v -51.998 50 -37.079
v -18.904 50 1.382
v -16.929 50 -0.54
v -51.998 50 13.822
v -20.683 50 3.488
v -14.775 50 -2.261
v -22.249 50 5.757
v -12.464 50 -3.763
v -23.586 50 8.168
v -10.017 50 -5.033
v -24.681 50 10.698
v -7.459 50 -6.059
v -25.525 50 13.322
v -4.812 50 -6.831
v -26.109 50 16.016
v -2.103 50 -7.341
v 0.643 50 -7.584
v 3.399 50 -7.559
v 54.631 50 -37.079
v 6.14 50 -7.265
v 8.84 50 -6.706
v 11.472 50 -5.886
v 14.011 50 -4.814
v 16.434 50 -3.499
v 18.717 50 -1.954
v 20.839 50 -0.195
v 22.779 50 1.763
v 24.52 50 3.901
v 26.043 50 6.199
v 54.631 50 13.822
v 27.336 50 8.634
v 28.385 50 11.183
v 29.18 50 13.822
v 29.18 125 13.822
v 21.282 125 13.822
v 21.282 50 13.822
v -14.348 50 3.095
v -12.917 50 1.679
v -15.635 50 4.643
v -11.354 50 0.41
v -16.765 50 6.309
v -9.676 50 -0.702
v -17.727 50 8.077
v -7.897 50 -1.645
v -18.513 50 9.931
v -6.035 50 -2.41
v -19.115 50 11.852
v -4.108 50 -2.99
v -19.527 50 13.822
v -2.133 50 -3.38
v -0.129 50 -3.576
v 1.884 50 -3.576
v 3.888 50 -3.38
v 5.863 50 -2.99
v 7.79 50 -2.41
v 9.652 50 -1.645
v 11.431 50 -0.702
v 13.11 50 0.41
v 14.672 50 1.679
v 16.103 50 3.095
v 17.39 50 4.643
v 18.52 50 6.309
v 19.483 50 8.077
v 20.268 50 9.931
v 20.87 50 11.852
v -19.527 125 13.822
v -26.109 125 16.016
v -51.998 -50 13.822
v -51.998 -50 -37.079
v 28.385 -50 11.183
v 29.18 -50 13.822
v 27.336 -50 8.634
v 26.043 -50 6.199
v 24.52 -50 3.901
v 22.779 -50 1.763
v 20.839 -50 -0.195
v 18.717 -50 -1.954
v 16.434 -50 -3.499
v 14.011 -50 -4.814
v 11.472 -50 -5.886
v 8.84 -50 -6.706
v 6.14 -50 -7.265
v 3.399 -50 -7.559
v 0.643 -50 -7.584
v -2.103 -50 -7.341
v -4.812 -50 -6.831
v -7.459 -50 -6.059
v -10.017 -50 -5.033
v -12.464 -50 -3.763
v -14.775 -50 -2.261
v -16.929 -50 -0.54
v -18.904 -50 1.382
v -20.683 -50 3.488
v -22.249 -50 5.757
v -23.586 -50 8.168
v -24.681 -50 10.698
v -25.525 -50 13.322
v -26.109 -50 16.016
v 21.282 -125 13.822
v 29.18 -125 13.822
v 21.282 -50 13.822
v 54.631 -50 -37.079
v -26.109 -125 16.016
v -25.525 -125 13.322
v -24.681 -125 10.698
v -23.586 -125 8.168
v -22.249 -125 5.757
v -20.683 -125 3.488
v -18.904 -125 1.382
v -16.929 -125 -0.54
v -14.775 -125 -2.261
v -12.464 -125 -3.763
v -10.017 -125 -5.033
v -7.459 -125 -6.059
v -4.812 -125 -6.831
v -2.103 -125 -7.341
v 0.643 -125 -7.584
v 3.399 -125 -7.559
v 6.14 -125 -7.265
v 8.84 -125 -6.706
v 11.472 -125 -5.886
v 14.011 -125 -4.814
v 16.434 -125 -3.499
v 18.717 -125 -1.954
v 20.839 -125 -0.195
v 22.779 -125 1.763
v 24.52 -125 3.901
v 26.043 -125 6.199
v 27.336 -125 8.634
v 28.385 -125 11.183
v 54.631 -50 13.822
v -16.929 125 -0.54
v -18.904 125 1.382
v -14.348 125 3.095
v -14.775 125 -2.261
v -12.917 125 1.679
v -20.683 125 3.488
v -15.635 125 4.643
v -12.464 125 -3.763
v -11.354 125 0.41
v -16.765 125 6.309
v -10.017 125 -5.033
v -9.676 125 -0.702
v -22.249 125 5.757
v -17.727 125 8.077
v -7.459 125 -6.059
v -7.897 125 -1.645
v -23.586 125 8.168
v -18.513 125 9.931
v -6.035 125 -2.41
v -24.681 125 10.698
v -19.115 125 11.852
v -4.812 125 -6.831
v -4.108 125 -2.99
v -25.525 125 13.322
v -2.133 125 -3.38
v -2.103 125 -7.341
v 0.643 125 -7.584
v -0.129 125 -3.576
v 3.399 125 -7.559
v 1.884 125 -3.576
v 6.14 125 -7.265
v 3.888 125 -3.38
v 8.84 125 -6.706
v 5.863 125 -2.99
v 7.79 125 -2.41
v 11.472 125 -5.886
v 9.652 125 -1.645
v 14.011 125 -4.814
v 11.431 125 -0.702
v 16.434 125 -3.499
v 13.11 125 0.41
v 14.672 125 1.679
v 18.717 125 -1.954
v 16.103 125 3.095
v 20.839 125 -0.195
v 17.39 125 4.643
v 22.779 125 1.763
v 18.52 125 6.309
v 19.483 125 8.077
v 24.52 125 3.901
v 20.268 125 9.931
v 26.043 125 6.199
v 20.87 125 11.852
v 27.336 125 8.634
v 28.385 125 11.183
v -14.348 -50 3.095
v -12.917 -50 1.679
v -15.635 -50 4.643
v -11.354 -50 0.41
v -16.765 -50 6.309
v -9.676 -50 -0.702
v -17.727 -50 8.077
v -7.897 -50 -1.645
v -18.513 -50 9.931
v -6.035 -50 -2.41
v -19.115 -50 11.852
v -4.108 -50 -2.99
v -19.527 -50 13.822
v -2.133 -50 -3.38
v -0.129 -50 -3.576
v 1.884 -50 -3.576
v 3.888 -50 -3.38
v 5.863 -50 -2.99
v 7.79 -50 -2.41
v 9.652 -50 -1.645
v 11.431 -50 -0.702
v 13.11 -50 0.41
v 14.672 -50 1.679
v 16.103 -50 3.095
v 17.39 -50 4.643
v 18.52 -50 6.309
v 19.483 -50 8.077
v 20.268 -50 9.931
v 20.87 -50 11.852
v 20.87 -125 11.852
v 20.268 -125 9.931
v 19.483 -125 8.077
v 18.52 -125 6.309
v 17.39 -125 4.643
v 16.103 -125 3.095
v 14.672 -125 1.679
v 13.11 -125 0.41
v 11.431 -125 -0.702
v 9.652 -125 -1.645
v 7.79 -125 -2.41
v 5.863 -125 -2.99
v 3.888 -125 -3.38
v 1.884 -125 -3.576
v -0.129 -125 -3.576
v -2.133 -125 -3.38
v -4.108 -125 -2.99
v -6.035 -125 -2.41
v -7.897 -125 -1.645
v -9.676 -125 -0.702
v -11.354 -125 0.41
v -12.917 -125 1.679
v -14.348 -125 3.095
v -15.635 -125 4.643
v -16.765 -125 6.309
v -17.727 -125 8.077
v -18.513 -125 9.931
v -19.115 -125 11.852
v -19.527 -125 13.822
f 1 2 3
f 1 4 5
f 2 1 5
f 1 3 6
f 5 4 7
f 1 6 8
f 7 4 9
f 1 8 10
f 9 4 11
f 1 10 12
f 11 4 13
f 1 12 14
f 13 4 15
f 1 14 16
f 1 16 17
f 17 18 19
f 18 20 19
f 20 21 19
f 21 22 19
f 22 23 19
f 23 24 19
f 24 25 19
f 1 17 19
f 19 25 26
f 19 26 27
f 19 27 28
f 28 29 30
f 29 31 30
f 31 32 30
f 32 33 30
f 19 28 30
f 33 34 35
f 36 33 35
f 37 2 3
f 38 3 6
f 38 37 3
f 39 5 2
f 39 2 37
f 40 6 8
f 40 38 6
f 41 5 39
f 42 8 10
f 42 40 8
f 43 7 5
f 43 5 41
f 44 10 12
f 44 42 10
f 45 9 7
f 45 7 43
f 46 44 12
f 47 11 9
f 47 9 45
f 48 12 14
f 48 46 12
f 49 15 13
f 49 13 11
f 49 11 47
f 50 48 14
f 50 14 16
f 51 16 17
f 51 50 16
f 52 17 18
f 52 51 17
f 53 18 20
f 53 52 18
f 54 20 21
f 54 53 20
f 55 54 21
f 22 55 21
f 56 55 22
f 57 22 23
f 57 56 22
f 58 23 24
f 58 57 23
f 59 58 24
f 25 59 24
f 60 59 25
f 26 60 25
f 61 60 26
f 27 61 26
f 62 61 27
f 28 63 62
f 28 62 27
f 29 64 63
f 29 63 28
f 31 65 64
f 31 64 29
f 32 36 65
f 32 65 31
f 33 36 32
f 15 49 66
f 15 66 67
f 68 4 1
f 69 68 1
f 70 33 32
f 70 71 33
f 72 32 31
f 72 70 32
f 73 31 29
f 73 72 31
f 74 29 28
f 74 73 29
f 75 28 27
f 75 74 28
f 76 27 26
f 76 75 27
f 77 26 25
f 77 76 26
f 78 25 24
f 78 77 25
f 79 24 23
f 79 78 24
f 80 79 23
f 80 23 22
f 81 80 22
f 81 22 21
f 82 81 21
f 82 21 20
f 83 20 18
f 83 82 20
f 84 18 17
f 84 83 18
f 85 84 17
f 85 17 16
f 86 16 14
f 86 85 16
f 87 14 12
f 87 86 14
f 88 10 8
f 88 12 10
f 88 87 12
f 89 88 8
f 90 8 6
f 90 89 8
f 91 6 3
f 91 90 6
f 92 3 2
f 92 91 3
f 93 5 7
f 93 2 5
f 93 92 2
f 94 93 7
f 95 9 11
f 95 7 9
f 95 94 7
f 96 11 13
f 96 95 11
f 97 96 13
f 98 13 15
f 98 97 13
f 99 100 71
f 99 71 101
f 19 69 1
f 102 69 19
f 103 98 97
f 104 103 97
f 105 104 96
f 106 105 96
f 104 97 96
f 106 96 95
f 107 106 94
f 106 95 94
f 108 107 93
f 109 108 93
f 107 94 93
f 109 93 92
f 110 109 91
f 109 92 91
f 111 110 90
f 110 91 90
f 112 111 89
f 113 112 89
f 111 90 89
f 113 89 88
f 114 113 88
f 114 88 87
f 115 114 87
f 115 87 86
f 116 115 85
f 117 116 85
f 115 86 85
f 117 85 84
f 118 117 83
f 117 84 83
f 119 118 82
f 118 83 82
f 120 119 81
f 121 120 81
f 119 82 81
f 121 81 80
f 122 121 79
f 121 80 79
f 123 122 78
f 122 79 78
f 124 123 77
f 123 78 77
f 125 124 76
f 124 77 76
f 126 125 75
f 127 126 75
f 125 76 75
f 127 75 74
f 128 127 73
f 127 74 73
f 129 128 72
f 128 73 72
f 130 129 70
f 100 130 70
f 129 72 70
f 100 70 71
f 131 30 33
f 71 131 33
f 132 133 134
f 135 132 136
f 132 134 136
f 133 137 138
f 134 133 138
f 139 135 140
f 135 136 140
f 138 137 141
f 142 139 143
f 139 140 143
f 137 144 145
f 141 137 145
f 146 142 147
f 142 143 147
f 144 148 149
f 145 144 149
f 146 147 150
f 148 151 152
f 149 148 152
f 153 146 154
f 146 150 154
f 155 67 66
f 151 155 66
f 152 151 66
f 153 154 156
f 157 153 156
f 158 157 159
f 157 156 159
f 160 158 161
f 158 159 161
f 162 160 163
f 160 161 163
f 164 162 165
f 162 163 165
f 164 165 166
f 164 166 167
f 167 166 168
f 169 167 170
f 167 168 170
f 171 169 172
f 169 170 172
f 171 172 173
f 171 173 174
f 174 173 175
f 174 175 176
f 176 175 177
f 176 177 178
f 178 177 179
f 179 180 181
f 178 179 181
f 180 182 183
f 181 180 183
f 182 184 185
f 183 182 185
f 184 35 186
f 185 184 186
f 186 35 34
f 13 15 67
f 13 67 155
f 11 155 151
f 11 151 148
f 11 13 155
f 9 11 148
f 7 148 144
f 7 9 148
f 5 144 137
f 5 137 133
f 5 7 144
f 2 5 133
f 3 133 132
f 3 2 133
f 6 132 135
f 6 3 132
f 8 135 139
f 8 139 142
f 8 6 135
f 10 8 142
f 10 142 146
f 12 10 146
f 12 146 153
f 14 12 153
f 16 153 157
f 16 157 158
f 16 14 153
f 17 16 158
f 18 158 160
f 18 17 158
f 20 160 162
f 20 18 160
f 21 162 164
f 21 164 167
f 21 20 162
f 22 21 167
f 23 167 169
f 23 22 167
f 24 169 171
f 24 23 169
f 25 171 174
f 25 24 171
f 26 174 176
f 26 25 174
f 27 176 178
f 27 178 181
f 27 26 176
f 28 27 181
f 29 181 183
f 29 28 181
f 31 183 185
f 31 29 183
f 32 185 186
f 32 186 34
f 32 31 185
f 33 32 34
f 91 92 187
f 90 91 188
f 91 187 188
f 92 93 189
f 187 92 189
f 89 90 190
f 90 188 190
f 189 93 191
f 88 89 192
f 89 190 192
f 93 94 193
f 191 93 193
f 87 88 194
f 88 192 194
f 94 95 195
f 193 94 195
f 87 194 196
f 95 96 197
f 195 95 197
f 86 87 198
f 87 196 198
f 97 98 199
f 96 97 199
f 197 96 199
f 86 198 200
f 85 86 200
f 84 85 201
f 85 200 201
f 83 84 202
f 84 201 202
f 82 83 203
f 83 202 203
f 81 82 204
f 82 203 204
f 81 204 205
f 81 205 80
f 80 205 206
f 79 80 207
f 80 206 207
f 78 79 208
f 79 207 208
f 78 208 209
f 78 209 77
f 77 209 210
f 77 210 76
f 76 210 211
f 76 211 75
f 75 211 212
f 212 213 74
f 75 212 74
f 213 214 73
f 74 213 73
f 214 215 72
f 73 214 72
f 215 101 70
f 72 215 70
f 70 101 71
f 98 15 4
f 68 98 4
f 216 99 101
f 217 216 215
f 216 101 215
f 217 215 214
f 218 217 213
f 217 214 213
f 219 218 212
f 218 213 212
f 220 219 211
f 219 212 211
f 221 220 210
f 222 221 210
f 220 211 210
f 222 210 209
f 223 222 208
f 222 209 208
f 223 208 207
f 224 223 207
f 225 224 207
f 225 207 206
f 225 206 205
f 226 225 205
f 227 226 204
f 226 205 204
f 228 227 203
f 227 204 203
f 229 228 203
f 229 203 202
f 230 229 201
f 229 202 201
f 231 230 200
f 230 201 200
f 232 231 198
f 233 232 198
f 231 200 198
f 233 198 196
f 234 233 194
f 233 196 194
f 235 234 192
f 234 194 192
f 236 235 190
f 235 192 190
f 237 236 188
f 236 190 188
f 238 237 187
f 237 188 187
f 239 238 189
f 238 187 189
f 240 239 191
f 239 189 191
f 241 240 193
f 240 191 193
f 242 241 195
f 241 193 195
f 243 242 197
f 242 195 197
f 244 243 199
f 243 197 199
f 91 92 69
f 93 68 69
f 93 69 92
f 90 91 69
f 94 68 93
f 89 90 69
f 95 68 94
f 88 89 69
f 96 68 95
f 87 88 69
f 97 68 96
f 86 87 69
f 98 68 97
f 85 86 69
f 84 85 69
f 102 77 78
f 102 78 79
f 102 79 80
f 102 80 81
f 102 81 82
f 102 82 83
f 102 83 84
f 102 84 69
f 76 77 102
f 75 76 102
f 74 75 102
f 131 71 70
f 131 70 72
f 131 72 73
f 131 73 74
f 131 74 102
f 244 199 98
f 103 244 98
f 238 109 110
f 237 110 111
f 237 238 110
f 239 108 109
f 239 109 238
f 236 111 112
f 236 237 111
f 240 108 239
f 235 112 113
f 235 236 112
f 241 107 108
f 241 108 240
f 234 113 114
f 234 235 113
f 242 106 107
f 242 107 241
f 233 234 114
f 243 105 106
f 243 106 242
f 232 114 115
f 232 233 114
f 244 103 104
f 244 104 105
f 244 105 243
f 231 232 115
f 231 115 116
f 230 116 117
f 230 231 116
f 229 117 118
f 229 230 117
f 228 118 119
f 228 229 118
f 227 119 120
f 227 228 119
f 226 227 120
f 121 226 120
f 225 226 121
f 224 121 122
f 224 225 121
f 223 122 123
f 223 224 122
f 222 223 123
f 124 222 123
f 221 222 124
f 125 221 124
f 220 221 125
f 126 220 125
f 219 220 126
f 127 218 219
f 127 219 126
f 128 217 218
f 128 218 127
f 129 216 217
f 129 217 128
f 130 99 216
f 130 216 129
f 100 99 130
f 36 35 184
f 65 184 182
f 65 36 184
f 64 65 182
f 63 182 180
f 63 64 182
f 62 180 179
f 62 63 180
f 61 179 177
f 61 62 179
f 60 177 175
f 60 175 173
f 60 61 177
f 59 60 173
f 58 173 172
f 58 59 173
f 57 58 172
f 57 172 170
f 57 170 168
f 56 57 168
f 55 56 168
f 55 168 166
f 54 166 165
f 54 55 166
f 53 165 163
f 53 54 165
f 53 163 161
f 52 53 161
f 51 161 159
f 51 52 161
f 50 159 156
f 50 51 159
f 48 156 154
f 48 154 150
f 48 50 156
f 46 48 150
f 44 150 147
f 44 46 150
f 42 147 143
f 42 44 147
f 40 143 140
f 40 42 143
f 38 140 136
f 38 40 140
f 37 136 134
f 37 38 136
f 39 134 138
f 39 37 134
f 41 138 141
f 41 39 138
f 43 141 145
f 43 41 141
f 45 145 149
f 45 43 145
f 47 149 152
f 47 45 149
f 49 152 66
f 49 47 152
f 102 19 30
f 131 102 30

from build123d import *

# Parameters (mm, degrees)
F1_DEPTH = 50
F3_DEPTH = 75


with BuildPart() as f1:
    # F0 (on Front) → F1 (new body)
    with BuildSketch(Plane.XZ):
        with BuildLine():
            ThreePointArc((29.1802864522, 13.822240755), (0.6428075813, -7.5843173072), (-26.108674705, 16.016246751))
            Line((-26.108674705, 16.016246751), (-51.9979521632, 13.822240755))
            Line((-51.9979521632, 13.822240755), (-51.9979521632, -37.0787084103))
            Line((-51.9979521632, -37.0787084103), (54.6307638288, -37.0787084103))
            Line((54.6307638288, -37.0787084103), (54.6307638288, 13.822240755))
            Line((54.6307638288, 13.822240755), (29.1802864522, 13.822240755))
        make_face()
    extrude(amount=F1_DEPTH)



with BuildPart() as f3:
    # F2 (on face) → F3 (new body)
    with BuildSketch(Plane.XZ.offset(50)):
        with BuildLine():
            Line((-19.5266548544, 13.822240755), (-26.108674705, 16.016246751))
            ThreePointArc((-26.108674705, 16.016246751), (0.6428075813, -7.5843173072), (29.1802864522, 13.822240755))
            Line((29.1802864522, 13.822240755), (21.2818607688, 13.822240755))
            ThreePointArc((21.2818607688, 13.822240755), (0.8776029572, -3.6009001218), (-19.5266548544, 13.822240755))
        make_face()
    extrude(amount=F3_DEPTH)


with BuildPart() as f1_1:
    add(f1.part)
    # F4: F3, F1 across face
    add(f3.part.mirror(Plane(origin=(1.0052951471, 0, -14.6059015673), x_dir=(1, 0, 0), z_dir=(0, 1, 0))))
    add(f1.part.mirror(Plane(origin=(1.0052951471, 0, -14.6059015673), x_dir=(1, 0, 0), z_dir=(0, 1, 0))))


solid = Compound([f3.part, f1_1.part])
